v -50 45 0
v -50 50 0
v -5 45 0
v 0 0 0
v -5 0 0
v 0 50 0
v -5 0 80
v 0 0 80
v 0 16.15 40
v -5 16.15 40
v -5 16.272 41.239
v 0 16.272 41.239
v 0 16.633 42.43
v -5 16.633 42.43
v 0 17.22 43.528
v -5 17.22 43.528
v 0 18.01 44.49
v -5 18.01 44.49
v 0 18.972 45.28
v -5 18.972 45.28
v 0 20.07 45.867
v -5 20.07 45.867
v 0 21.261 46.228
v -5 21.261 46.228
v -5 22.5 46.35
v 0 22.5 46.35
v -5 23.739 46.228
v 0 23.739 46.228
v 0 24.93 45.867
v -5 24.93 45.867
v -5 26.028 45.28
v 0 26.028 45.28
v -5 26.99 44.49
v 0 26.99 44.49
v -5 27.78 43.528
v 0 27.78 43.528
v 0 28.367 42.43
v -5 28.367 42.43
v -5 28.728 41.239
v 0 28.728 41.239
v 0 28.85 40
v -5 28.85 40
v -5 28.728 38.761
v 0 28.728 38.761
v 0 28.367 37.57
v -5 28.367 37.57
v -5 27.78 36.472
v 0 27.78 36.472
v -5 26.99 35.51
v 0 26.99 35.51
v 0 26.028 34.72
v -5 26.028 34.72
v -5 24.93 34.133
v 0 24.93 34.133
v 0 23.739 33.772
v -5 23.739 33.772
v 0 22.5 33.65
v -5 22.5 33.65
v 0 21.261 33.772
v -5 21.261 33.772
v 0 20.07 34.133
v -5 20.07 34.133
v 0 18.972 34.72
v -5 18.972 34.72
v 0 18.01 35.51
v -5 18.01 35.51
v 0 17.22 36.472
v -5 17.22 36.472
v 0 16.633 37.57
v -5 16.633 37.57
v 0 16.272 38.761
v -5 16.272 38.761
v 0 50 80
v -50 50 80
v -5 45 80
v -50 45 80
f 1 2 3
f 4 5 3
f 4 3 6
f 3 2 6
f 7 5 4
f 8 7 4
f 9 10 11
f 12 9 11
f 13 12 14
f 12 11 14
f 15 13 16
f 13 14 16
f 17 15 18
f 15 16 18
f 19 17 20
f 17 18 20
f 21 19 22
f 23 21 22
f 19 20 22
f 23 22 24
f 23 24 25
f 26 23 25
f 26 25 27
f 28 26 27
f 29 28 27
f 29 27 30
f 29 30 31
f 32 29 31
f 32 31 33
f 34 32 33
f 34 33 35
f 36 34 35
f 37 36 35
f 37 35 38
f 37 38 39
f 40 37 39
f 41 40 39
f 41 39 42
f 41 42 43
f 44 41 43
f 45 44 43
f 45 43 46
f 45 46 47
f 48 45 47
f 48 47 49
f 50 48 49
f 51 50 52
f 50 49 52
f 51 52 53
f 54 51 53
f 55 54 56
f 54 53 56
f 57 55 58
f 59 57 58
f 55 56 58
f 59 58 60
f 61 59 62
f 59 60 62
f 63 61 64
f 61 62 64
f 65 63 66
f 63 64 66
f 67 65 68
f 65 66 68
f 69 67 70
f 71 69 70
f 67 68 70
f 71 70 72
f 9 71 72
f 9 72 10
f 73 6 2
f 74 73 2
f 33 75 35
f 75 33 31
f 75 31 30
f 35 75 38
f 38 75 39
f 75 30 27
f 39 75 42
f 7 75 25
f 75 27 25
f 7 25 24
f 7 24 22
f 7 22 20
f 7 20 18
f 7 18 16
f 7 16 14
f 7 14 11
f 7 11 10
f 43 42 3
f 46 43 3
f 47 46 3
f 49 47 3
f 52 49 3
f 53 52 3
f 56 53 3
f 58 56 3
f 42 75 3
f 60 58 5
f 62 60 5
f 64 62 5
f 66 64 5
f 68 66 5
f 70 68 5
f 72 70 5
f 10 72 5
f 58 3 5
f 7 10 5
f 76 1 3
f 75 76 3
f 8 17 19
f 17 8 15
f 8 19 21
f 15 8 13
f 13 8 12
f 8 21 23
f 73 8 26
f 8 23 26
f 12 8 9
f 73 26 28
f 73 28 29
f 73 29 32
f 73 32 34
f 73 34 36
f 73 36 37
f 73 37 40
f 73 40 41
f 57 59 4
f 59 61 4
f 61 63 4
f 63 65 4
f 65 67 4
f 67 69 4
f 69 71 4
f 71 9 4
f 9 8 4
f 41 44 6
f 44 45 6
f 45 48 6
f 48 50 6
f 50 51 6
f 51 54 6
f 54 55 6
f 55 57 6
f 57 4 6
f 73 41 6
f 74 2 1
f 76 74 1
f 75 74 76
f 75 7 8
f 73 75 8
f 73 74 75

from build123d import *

# Parameters (mm, degrees)
SALIENTE_EXTRUIR1_DEPTH = 80
CORTAR_EXTRUIR1_REACH   = 106.523
CROQUIS2_R              = 6.35


with BuildPart() as part:
    # Croquis1 → Saliente-Extruir1 (new body)
    with BuildSketch(Plane.XY):
        Polygon((0, 0), (0, 50), (-50, 50), (-50, 45), (-5, 45), (-5, 0), align=None)
    extrude(amount=SALIENTE_EXTRUIR1_DEPTH)

    # Croquis2 → Cortar-Extruir1 (cut, up to next)
    with BuildSketch(Plane.ZY.offset(5), mode=Mode.PRIVATE) as cortar_extruir1_sk1:
        with Locations(Location((40, 22.5, 0), (0, 0, 270))):
            Circle(CROQUIS2_R)
    cortar_extruir1_tool1 = extrude(cortar_extruir1_sk1.sketch, amount=-CORTAR_EXTRUIR1_REACH, mode=Mode.PRIVATE) & part.part
    add(cortar_extruir1_tool1.solids().sort_by_distance((-5, 22.5, 40))[0], mode=Mode.SUBTRACT)


solid = part.part
